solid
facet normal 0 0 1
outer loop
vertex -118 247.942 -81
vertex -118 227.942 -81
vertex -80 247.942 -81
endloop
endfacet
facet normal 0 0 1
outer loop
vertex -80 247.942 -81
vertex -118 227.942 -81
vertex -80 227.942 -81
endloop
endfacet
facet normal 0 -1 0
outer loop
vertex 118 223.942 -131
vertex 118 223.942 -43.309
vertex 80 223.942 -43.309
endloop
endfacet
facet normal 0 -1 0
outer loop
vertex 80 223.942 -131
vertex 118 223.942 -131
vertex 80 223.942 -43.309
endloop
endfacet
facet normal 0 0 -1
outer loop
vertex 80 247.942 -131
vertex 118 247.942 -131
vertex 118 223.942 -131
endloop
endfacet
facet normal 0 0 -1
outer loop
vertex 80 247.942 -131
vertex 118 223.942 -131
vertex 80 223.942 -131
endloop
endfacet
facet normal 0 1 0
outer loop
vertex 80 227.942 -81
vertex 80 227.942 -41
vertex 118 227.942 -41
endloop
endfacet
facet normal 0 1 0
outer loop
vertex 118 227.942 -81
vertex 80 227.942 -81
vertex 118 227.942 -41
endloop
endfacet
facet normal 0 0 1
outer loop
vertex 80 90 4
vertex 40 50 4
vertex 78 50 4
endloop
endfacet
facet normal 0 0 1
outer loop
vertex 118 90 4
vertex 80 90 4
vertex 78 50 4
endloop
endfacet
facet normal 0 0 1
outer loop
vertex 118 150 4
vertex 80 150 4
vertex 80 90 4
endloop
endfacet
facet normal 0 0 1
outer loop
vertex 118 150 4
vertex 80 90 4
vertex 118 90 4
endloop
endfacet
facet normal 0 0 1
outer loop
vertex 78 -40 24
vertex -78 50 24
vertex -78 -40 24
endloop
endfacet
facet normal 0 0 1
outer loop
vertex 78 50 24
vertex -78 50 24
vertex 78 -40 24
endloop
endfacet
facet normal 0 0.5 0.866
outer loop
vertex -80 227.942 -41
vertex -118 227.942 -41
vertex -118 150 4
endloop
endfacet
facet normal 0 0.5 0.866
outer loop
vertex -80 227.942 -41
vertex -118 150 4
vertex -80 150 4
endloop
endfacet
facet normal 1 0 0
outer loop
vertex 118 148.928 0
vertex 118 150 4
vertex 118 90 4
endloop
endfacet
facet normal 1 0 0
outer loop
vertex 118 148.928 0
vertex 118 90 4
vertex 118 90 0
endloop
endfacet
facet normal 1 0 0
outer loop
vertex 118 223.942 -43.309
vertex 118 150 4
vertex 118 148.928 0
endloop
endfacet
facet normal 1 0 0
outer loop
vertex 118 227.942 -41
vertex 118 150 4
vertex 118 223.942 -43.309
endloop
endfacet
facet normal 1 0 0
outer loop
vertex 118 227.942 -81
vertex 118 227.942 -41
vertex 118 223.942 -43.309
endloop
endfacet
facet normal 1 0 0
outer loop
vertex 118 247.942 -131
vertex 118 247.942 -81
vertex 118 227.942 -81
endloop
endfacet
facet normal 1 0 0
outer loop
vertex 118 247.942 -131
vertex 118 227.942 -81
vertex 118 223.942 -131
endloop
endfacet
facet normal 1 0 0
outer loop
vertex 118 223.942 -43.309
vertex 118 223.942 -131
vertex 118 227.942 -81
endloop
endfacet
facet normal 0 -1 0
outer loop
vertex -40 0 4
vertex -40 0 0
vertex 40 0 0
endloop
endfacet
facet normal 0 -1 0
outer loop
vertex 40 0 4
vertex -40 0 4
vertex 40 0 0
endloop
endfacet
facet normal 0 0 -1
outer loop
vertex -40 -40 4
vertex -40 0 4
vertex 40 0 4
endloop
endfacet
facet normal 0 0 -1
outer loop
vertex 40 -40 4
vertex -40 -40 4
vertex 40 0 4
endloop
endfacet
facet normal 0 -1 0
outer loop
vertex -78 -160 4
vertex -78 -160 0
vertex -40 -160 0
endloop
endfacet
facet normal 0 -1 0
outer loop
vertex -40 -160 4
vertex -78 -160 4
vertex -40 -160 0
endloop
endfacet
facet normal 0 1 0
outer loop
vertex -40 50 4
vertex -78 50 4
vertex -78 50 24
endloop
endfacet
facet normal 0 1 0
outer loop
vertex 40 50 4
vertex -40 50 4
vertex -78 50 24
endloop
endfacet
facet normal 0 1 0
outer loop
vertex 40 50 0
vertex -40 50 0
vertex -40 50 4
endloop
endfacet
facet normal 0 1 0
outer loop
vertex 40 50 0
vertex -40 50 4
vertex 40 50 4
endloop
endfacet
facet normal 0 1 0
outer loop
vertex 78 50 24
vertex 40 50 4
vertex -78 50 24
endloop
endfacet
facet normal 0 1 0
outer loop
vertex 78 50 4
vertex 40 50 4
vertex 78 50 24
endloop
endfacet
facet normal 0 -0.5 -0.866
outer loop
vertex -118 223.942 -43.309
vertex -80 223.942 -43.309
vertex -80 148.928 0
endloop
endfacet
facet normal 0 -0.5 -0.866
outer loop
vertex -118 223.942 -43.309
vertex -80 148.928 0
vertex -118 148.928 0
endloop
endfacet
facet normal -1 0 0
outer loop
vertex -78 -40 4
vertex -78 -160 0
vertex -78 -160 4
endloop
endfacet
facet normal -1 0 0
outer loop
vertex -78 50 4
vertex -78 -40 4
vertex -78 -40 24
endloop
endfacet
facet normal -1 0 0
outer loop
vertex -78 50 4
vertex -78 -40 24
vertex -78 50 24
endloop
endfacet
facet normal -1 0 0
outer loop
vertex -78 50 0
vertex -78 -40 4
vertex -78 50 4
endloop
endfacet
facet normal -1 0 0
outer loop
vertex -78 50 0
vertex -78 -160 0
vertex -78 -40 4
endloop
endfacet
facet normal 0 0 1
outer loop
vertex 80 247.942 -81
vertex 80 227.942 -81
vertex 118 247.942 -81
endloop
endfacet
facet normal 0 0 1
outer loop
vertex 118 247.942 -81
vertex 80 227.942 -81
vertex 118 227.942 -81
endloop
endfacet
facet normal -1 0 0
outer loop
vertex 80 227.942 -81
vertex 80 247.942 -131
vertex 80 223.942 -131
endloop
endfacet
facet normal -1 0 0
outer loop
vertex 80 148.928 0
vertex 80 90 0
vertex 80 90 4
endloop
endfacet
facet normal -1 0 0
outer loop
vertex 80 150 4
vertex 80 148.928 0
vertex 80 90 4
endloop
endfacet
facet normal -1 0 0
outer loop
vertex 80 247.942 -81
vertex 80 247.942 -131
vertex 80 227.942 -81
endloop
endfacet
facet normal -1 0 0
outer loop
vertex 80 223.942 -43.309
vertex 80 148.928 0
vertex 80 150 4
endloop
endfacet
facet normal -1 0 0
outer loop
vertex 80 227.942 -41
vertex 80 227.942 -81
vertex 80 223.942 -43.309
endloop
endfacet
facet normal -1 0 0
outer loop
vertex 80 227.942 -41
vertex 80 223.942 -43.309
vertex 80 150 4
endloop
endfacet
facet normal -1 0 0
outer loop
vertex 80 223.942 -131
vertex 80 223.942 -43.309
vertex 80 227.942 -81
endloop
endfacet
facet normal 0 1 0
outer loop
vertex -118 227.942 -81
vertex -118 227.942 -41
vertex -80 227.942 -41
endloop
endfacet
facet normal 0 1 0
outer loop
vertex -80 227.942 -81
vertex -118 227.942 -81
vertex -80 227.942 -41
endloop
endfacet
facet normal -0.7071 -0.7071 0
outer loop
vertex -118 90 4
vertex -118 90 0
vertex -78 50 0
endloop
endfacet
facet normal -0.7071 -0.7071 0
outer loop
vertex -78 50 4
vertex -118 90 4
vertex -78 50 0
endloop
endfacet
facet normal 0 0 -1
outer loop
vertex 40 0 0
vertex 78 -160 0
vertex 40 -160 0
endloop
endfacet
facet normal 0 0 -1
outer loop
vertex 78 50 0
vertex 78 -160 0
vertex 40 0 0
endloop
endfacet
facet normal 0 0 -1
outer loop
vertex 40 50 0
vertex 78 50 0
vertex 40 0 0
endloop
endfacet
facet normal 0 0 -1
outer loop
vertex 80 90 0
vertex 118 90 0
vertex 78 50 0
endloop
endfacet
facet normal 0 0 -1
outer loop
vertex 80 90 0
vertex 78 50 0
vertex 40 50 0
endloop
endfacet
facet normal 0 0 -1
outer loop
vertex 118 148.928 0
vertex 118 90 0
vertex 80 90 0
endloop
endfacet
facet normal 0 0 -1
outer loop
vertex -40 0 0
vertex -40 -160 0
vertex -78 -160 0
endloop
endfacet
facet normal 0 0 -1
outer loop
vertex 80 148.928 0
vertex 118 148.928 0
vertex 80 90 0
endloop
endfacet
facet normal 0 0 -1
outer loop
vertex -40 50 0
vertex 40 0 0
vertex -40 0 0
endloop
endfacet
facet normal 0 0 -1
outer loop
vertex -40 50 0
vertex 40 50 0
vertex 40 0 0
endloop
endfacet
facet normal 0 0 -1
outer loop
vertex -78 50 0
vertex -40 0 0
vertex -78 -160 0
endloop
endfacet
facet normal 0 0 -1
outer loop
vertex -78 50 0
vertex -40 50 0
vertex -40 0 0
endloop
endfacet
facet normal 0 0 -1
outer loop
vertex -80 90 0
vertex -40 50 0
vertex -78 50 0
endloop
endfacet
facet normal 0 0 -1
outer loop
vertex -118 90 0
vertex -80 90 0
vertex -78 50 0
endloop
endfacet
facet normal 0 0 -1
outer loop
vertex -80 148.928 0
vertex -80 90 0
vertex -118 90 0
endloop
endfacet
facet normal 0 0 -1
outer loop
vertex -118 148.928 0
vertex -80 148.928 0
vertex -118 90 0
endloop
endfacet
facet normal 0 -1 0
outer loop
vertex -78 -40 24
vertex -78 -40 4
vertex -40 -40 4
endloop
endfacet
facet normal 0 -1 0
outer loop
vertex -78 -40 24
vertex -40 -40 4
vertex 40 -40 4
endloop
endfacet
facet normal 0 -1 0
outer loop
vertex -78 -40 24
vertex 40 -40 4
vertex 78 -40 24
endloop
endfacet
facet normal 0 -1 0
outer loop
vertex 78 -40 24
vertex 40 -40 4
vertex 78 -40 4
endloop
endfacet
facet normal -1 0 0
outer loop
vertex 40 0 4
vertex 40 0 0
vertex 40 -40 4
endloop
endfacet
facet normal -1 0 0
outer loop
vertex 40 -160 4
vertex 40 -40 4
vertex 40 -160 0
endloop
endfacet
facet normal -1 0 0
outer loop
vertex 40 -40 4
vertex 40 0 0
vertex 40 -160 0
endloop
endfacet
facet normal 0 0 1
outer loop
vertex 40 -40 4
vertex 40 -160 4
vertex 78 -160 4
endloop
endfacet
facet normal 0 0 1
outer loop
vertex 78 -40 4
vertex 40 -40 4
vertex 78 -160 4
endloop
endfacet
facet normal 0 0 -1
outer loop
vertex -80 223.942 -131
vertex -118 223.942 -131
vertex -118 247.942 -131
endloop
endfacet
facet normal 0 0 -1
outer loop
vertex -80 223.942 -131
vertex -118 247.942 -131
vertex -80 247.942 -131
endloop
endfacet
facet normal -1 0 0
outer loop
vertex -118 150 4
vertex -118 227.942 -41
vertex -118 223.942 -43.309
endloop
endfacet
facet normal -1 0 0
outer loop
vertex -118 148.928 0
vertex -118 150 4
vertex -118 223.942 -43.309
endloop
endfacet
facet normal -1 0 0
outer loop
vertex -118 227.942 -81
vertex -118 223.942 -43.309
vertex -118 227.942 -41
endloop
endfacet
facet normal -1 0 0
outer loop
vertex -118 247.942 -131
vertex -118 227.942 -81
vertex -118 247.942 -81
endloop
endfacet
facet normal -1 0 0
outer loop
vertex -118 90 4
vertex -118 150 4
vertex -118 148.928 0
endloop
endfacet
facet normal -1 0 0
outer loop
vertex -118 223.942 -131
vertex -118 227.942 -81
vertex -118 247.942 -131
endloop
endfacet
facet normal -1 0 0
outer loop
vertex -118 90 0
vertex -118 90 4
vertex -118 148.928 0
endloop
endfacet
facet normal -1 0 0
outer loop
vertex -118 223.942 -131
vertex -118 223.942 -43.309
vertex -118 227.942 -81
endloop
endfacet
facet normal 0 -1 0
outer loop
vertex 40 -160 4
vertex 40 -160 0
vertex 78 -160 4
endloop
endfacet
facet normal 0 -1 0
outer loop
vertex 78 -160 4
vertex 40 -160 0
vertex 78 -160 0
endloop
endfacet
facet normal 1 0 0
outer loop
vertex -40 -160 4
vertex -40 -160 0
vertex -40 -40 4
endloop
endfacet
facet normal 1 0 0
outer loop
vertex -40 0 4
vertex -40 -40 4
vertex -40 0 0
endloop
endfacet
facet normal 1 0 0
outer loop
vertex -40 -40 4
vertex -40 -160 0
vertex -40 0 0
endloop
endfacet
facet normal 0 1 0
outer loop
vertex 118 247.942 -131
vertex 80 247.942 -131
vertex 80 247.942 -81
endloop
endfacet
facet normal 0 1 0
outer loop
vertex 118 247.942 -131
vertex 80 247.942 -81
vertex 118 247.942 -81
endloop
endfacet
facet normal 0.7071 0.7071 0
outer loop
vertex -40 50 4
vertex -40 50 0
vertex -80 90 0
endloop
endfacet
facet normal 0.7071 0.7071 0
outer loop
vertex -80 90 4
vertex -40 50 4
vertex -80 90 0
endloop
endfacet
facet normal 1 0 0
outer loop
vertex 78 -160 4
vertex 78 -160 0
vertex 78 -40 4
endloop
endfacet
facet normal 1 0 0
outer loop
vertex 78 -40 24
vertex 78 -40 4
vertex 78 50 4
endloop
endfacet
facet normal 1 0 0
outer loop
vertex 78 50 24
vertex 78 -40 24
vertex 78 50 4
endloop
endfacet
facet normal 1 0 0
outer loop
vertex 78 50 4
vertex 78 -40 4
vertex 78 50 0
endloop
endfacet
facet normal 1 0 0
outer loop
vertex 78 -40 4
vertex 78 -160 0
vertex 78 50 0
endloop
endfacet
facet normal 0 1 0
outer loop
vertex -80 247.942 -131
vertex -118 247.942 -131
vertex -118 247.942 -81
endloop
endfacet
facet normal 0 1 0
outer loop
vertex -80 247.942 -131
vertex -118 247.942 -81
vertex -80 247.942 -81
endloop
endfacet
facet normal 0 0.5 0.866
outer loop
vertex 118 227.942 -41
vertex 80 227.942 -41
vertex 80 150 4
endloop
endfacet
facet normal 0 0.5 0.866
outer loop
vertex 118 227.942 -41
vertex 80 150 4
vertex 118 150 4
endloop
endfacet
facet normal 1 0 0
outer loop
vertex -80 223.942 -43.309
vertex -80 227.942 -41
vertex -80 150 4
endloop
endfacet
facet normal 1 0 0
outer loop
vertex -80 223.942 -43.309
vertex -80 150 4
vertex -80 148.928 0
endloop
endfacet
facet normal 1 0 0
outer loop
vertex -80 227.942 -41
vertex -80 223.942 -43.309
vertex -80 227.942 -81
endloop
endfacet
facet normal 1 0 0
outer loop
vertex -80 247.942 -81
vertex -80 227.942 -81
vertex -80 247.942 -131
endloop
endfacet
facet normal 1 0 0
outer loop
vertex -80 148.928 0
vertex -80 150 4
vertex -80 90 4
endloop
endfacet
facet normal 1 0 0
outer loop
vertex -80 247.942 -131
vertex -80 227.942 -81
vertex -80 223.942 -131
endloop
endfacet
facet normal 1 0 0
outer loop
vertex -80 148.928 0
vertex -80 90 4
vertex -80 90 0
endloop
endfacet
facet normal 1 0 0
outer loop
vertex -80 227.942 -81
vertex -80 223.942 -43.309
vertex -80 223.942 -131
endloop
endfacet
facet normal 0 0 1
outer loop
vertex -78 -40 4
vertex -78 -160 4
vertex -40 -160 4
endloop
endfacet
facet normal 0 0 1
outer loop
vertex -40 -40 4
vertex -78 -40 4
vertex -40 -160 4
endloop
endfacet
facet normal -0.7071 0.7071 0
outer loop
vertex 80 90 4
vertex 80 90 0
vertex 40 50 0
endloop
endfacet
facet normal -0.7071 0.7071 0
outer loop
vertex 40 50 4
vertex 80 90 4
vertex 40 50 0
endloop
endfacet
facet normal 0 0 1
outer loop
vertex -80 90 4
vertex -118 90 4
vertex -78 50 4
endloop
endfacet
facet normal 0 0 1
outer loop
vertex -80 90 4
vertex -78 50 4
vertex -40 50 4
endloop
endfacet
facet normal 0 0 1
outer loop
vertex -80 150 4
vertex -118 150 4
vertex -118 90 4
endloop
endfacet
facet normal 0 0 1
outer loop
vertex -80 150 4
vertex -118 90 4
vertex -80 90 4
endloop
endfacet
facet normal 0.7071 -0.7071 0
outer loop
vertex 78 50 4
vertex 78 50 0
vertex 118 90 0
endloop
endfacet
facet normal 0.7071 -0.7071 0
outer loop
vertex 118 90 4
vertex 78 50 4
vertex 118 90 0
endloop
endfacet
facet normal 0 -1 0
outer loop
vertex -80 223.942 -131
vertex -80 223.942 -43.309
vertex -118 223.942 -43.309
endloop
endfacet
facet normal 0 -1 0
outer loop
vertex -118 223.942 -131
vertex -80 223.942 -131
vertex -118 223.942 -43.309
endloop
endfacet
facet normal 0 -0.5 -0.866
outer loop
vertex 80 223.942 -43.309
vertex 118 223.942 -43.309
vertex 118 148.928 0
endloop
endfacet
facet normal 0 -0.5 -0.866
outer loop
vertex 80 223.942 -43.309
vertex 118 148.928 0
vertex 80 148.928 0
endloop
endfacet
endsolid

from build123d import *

# Parameters (mm, degrees)
EXTRUDE_1_DEPTH = 4
SKETCH_11_W     = 156
SKETCH_11_H     = 90
EXTRUDE_2_DEPTH = 20
SKETCH_12_W     = 38
SKETCH_12_H     = 4
SKETCH_14_W     = 38
SKETCH_14_H     = 50
EXTRUDE_3_DEPTH = 20


with BuildPart() as part:
    # 草图1 → 凸台-拉伸1 (new body)
    with BuildSketch(Plane.XY):
        Polygon((-40, 0), (40, 0), (40, -160), (78, -160), (78, 0), (78, 50), (118, 90), (80, 90), (40, 50), (-40, 50), (-80, 90), (-118, 90), (-78, 50), (-78, 0), (-78, -160), (-40, -160), align=None)
    extrude(amount=EXTRUDE_1_DEPTH)

    # 草图11 → 凸台-拉伸2 (add)
    with BuildSketch(Plane.XY.offset(4)):
        with Locations((0, 5)):
            Rectangle(SKETCH_11_W, SKETCH_11_H)
    extrude(amount=EXTRUDE_2_DEPTH)

    # 扫描1: sweep along a path in 草图13
    with BuildLine(Plane(origin=(78, 0, 0), x_dir=(0, 0, -1), z_dir=(1, 0, 0))) as sweep_1_path:
        Line((-4, 90), (-4, 150))
        Line((-4, 150), (41, 227.942286341))
        Line((41, 227.942286341), (131, 227.942286341))
    # 草图12 → 扫描1 (sweep)
    with BuildSketch(Plane(origin=(0, 90, 0), x_dir=(1, 0, 0), z_dir=(0, 1, 0))):
        with Locations((-99, -2)):
            Rectangle(SKETCH_12_W, SKETCH_12_H)
        with Locations((99, -2)):
            Rectangle(SKETCH_12_W, SKETCH_12_H)
    sweep(path=sweep_1_path.line, transition=Transition.RIGHT)

    # 草图14 → 凸台-拉伸3 (add)
    with BuildSketch(Plane(origin=(0, 227.942286341, 0), x_dir=(1, 0, 0), z_dir=(0, 1, 0))):
        with Locations((-99, 106)):
            Rectangle(SKETCH_14_W, SKETCH_14_H)
        with Locations((99, 106)):
            Rectangle(SKETCH_14_W, SKETCH_14_H)
    extrude(amount=EXTRUDE_3_DEPTH)


solid = part.part
